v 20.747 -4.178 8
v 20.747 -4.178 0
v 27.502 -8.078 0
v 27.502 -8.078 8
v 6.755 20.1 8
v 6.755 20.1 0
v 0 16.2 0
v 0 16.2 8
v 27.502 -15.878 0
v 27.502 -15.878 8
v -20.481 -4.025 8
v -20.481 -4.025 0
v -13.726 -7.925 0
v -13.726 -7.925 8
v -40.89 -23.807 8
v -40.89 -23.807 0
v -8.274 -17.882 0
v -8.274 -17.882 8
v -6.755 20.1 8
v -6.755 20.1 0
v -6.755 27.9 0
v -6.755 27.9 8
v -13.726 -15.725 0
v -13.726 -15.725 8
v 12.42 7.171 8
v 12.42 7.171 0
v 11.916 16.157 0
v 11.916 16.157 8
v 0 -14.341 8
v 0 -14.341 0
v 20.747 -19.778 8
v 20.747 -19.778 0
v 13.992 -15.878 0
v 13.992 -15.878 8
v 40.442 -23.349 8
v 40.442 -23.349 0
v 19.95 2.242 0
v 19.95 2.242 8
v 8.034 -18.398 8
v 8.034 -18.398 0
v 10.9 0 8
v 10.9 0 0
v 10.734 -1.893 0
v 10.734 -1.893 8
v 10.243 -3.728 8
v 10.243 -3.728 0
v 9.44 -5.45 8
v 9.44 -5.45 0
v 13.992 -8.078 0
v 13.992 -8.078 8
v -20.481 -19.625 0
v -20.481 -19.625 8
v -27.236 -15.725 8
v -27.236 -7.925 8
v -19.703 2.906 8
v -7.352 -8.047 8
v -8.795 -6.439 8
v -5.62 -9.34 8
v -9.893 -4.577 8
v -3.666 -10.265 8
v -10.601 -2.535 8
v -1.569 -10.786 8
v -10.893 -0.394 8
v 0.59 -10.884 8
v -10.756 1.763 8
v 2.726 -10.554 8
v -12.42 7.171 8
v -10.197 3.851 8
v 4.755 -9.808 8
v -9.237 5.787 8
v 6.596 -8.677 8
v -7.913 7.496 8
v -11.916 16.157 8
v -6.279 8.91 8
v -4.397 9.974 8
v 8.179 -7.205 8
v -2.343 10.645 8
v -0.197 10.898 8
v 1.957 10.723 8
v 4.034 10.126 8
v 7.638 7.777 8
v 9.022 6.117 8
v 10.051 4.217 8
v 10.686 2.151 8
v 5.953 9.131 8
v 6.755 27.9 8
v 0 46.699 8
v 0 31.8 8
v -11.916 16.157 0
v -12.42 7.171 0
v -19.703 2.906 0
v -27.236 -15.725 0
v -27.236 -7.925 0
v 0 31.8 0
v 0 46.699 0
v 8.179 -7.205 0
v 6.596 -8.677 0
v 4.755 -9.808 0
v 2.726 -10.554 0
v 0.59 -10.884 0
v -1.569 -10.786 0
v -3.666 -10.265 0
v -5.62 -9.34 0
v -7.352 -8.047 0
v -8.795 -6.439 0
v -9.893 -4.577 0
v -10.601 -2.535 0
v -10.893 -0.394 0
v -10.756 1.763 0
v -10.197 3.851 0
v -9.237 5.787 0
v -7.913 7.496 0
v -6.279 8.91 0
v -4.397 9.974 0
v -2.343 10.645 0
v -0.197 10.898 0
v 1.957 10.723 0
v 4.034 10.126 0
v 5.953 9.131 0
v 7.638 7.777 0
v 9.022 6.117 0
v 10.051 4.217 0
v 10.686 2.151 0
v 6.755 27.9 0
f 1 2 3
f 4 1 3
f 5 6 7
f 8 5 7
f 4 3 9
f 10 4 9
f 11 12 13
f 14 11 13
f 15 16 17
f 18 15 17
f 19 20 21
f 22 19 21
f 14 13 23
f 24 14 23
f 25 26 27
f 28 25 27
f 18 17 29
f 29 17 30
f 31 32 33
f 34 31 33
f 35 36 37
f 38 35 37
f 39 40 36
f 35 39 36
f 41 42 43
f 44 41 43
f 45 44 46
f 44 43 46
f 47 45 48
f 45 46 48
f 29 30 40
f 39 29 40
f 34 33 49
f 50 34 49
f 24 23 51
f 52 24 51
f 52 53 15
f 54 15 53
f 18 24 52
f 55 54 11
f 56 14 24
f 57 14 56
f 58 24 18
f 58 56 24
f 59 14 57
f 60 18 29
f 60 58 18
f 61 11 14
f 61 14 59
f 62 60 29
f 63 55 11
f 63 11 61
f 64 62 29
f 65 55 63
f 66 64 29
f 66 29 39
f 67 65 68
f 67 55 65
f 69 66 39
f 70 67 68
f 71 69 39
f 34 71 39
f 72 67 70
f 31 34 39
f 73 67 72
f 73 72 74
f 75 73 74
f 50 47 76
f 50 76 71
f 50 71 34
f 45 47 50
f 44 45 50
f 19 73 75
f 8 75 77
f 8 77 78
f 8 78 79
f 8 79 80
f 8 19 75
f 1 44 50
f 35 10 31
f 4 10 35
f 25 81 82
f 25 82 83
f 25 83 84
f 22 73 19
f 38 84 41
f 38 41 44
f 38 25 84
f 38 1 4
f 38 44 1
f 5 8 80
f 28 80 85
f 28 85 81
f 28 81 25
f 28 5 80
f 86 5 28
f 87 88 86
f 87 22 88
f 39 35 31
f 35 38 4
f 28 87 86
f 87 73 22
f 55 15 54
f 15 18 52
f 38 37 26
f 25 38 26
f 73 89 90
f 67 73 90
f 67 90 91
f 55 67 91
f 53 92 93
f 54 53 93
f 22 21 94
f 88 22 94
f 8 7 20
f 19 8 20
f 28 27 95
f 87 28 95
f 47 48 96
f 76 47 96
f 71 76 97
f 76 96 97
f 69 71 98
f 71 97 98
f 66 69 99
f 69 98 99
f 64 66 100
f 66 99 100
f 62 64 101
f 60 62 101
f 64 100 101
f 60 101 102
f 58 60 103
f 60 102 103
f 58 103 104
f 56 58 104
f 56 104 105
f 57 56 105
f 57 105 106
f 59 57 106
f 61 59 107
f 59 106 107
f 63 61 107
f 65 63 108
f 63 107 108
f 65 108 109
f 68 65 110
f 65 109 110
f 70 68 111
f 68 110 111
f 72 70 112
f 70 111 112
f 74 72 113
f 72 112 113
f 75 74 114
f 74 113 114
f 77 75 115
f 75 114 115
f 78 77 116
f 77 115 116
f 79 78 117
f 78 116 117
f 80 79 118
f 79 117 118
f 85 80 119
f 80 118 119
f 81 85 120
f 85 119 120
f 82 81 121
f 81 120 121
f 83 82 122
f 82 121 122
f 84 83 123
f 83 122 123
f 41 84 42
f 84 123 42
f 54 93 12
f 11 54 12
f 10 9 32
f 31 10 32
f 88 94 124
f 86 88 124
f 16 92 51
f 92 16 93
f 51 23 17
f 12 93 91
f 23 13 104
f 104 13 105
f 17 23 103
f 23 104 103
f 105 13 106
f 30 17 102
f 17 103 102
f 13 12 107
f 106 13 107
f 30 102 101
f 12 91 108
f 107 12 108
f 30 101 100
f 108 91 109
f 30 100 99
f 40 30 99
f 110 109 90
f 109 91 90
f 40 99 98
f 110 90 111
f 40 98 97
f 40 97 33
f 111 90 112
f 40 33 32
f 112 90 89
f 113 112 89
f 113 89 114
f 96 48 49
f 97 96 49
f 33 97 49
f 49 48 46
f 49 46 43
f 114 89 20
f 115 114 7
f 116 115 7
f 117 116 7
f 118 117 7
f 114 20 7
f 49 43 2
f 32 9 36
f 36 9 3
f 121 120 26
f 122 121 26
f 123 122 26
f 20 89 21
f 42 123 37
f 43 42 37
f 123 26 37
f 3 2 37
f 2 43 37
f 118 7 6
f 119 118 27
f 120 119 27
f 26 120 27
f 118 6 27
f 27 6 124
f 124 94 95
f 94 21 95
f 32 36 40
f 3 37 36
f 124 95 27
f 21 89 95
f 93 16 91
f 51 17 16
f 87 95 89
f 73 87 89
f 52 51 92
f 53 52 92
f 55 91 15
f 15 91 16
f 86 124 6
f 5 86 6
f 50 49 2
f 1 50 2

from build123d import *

# Parameters (mm, degrees)
F1_DEPTH = 8


# Not quite as in the source:
# - ends of sketch curves that miss each other by under 0.0002 mm in the source are joined


with BuildPart() as f1:
    # F0 (on Top) → F1 (new body)
    with BuildSketch(Plane.XY):
        Polygon((8.0340162625, -18.397915233), (40.4422496394, -23.3490666912), (19.9500470696, 2.2415004228), (12.4201863904, 7.1707647293), (11.9161368405, 16.1565585761), (0, 46.6985489201), (-11.9161368405, 16.1565585761), (-12.4201318249, 7.170681376), (-19.702678316, 2.9058864326), (-40.8897429157, -23.8067811423), (-8.2744899158, -17.8816622036), (0, -14.3414903669), align=None)
        Polygon((-20.4809666485, -4.0247617542), (-13.725968499, -7.9247617542), (-13.725968499, -15.7247617542), (-20.4809666485, -19.6247617542), (-27.2359647981, -15.7247617542), (-27.2359647981, -7.9247617542), align=None, mode=Mode.SUBTRACT)
        Polygon((13.9923272284, -15.8783317751), (13.9923272284, -8.0783317751), (20.7473253779, -4.1783317751), (27.5023235274, -8.0783317751), (27.5023235274, -15.8783317751), (20.7473253779, -19.7783317751), align=None, mode=Mode.SUBTRACT)
        with BuildLine():
            ThreePointArc((-9.4396629017, -5.4500242478), (-2.8211411141, 10.5285878832), (10.9, 0))
            ThreePointArc((10.9, 0), (10.5285987532, -2.8211005467), (9.4397049001, -5.4499515043))
            ThreePointArc((9.4397049001, -5.4499515043), (4.19985e-05, -10.8999999999), (-9.4396629017, -5.4500242478))
        make_face(mode=Mode.SUBTRACT)
        Polygon((6.7549981495, 27.9), (6.7549981495, 20.1), (0, 16.2), (-6.7549981495, 20.1), (-6.7549981495, 27.9), (0, 31.8), align=None, mode=Mode.SUBTRACT)
    extrude(amount=F1_DEPTH)


solid = f1.part
